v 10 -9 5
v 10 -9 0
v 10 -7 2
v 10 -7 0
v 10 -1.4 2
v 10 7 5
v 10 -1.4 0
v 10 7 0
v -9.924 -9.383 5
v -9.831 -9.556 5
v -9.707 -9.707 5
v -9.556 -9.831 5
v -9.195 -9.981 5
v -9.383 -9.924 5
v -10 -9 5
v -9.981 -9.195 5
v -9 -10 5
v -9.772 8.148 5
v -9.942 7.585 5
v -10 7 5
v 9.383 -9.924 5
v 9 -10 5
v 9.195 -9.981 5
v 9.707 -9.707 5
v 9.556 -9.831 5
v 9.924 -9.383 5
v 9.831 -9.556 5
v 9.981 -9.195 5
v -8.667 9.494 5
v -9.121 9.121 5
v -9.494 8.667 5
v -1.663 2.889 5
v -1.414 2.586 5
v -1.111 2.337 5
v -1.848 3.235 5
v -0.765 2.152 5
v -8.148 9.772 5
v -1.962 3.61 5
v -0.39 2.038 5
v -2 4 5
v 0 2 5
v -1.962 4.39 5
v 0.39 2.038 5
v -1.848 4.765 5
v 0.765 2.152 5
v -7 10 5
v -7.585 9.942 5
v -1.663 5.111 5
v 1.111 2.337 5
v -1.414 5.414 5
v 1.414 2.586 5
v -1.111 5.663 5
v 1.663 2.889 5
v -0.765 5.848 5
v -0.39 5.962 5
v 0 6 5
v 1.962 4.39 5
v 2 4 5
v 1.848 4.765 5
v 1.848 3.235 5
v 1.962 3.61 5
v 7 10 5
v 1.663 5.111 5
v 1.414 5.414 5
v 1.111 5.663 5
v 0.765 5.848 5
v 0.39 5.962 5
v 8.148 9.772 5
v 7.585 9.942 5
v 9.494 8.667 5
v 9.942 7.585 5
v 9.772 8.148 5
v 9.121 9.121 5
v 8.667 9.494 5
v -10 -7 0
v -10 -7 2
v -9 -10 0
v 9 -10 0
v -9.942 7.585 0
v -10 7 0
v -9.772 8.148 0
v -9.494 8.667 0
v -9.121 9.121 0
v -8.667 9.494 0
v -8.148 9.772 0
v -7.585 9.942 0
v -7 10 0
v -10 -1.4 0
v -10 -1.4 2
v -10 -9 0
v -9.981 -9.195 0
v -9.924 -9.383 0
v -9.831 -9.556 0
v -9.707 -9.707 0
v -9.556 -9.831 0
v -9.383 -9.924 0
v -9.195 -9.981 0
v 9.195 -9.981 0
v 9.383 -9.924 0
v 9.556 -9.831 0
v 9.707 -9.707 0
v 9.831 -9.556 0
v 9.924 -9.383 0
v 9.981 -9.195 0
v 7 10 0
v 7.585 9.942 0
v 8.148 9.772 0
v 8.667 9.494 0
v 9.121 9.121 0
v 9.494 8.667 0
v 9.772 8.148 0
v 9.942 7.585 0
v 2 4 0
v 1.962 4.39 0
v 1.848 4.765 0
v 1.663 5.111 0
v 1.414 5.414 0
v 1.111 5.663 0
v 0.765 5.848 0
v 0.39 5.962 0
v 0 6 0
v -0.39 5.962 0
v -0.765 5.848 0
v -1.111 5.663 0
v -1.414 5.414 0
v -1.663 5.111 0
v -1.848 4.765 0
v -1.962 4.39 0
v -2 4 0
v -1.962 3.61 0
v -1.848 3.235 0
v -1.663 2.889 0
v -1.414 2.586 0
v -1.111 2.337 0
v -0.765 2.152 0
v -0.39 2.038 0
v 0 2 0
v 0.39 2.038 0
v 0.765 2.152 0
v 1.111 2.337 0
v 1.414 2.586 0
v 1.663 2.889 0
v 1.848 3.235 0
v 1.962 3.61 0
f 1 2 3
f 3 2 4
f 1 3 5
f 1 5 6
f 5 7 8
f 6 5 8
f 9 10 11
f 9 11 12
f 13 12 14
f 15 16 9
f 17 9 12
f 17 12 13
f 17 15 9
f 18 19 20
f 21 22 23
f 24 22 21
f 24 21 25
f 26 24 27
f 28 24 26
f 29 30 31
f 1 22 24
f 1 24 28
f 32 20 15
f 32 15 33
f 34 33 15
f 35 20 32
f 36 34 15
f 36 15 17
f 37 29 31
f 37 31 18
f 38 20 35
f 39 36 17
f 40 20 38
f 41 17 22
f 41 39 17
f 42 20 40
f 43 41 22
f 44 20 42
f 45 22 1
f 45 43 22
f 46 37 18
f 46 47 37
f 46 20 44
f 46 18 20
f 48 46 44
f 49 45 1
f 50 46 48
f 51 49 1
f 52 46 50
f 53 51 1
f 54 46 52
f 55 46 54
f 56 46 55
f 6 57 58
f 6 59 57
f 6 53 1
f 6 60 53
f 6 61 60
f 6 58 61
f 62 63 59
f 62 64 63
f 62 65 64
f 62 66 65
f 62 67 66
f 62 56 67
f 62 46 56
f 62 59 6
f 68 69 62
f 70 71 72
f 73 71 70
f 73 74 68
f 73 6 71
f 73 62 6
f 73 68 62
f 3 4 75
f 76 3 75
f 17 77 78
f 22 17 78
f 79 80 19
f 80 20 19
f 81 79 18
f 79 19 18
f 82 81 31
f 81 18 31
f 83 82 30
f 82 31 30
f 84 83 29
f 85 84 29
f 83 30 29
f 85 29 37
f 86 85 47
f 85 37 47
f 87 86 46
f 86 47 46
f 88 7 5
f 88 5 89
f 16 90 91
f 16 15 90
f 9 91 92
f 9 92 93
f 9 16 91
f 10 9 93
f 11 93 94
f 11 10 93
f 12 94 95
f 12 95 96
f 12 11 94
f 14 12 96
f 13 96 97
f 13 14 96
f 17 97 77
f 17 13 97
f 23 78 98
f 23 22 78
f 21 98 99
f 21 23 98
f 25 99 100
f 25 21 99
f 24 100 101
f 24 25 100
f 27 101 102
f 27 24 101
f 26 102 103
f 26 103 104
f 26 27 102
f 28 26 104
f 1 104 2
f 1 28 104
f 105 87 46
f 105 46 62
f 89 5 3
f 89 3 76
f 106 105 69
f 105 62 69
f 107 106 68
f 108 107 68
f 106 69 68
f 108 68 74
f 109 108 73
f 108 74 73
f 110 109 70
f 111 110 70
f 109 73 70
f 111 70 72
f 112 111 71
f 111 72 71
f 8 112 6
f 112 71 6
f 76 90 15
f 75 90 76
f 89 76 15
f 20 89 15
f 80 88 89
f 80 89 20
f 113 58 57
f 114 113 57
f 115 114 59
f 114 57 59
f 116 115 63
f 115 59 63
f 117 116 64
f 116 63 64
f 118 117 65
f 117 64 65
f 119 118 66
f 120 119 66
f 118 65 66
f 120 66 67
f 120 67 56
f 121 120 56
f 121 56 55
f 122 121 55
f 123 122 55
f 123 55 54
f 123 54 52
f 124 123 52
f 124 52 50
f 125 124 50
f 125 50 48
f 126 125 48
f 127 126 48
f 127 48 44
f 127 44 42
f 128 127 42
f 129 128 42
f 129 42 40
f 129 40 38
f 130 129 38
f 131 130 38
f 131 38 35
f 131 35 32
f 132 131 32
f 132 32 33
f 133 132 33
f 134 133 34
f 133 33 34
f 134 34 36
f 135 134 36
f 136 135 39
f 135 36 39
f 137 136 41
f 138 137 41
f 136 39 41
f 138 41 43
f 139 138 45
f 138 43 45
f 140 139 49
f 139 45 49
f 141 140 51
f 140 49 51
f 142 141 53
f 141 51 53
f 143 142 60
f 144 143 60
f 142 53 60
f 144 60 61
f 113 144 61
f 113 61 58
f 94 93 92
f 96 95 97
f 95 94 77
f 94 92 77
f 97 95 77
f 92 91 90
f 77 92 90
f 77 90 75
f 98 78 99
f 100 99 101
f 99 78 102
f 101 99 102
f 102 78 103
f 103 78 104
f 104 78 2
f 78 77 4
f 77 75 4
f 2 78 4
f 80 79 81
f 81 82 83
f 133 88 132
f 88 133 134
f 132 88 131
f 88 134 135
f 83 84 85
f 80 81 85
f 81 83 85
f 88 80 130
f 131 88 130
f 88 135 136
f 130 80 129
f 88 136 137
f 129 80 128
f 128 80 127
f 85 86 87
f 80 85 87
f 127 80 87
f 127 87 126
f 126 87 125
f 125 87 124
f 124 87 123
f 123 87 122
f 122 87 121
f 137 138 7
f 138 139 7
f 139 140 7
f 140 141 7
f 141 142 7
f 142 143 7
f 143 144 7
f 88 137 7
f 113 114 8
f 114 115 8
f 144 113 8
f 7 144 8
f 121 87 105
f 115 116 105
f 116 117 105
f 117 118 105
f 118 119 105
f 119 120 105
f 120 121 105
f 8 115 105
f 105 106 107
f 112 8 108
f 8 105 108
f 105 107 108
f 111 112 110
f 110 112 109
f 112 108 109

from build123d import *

# Parameters (mm, degrees)
SKETCH1_W           = 20
SKETCH1_H           = 20
BOSS_EXTRUDE1_DEPTH = 5
SKETCH2_R           = 2
CUT_EXTRUDE1_DEPTH  = 6
FILLET1_R           = 3
FILLET2_R           = 1
SKETCH3_W           = 20
SKETCH3_H           = 5.6
CUT_EXTRUDE2_DEPTH  = 2


with BuildPart() as part:
    # Sketch1 → Boss-Extrude1 (new body)
    with BuildSketch(Plane.XY):
        Rectangle(SKETCH1_W, SKETCH1_H)
    extrude(amount=BOSS_EXTRUDE1_DEPTH)

    # Sketch2 → Cut-Extrude1 (cut, through all)
    with BuildSketch(Plane.XY.offset(5)):
        with Locations((0, 4)):
            Circle(SKETCH2_R)
    extrude(amount=-CUT_EXTRUDE1_DEPTH, mode=Mode.SUBTRACT)

    # Fillet1
    fillet1_edges = [part.edges().sort_by_distance(p)[0] for p in [
        (-10, 10, 2.5),
        (10, 10, 2.5),
    ]]
    fillet(fillet1_edges, radius=FILLET1_R)

    # Fillet2
    fillet2_edges = [part.edges().sort_by_distance(p)[0] for p in [
        (10, -10, 2.5),
        (-10, -10, 2.5),
    ]]
    fillet(fillet2_edges, radius=FILLET2_R)

    # Sketch3 → Cut-Extrude2 (cut)
    with BuildSketch(Plane(origin=(0, 0, 0), x_dir=(-1, 0, 0), z_dir=(0, 0, -1))):
        with Locations((0, -4.2)):
            Rectangle(SKETCH3_W, SKETCH3_H)
    extrude(amount=-CUT_EXTRUDE2_DEPTH, mode=Mode.SUBTRACT)


solid = part.part
